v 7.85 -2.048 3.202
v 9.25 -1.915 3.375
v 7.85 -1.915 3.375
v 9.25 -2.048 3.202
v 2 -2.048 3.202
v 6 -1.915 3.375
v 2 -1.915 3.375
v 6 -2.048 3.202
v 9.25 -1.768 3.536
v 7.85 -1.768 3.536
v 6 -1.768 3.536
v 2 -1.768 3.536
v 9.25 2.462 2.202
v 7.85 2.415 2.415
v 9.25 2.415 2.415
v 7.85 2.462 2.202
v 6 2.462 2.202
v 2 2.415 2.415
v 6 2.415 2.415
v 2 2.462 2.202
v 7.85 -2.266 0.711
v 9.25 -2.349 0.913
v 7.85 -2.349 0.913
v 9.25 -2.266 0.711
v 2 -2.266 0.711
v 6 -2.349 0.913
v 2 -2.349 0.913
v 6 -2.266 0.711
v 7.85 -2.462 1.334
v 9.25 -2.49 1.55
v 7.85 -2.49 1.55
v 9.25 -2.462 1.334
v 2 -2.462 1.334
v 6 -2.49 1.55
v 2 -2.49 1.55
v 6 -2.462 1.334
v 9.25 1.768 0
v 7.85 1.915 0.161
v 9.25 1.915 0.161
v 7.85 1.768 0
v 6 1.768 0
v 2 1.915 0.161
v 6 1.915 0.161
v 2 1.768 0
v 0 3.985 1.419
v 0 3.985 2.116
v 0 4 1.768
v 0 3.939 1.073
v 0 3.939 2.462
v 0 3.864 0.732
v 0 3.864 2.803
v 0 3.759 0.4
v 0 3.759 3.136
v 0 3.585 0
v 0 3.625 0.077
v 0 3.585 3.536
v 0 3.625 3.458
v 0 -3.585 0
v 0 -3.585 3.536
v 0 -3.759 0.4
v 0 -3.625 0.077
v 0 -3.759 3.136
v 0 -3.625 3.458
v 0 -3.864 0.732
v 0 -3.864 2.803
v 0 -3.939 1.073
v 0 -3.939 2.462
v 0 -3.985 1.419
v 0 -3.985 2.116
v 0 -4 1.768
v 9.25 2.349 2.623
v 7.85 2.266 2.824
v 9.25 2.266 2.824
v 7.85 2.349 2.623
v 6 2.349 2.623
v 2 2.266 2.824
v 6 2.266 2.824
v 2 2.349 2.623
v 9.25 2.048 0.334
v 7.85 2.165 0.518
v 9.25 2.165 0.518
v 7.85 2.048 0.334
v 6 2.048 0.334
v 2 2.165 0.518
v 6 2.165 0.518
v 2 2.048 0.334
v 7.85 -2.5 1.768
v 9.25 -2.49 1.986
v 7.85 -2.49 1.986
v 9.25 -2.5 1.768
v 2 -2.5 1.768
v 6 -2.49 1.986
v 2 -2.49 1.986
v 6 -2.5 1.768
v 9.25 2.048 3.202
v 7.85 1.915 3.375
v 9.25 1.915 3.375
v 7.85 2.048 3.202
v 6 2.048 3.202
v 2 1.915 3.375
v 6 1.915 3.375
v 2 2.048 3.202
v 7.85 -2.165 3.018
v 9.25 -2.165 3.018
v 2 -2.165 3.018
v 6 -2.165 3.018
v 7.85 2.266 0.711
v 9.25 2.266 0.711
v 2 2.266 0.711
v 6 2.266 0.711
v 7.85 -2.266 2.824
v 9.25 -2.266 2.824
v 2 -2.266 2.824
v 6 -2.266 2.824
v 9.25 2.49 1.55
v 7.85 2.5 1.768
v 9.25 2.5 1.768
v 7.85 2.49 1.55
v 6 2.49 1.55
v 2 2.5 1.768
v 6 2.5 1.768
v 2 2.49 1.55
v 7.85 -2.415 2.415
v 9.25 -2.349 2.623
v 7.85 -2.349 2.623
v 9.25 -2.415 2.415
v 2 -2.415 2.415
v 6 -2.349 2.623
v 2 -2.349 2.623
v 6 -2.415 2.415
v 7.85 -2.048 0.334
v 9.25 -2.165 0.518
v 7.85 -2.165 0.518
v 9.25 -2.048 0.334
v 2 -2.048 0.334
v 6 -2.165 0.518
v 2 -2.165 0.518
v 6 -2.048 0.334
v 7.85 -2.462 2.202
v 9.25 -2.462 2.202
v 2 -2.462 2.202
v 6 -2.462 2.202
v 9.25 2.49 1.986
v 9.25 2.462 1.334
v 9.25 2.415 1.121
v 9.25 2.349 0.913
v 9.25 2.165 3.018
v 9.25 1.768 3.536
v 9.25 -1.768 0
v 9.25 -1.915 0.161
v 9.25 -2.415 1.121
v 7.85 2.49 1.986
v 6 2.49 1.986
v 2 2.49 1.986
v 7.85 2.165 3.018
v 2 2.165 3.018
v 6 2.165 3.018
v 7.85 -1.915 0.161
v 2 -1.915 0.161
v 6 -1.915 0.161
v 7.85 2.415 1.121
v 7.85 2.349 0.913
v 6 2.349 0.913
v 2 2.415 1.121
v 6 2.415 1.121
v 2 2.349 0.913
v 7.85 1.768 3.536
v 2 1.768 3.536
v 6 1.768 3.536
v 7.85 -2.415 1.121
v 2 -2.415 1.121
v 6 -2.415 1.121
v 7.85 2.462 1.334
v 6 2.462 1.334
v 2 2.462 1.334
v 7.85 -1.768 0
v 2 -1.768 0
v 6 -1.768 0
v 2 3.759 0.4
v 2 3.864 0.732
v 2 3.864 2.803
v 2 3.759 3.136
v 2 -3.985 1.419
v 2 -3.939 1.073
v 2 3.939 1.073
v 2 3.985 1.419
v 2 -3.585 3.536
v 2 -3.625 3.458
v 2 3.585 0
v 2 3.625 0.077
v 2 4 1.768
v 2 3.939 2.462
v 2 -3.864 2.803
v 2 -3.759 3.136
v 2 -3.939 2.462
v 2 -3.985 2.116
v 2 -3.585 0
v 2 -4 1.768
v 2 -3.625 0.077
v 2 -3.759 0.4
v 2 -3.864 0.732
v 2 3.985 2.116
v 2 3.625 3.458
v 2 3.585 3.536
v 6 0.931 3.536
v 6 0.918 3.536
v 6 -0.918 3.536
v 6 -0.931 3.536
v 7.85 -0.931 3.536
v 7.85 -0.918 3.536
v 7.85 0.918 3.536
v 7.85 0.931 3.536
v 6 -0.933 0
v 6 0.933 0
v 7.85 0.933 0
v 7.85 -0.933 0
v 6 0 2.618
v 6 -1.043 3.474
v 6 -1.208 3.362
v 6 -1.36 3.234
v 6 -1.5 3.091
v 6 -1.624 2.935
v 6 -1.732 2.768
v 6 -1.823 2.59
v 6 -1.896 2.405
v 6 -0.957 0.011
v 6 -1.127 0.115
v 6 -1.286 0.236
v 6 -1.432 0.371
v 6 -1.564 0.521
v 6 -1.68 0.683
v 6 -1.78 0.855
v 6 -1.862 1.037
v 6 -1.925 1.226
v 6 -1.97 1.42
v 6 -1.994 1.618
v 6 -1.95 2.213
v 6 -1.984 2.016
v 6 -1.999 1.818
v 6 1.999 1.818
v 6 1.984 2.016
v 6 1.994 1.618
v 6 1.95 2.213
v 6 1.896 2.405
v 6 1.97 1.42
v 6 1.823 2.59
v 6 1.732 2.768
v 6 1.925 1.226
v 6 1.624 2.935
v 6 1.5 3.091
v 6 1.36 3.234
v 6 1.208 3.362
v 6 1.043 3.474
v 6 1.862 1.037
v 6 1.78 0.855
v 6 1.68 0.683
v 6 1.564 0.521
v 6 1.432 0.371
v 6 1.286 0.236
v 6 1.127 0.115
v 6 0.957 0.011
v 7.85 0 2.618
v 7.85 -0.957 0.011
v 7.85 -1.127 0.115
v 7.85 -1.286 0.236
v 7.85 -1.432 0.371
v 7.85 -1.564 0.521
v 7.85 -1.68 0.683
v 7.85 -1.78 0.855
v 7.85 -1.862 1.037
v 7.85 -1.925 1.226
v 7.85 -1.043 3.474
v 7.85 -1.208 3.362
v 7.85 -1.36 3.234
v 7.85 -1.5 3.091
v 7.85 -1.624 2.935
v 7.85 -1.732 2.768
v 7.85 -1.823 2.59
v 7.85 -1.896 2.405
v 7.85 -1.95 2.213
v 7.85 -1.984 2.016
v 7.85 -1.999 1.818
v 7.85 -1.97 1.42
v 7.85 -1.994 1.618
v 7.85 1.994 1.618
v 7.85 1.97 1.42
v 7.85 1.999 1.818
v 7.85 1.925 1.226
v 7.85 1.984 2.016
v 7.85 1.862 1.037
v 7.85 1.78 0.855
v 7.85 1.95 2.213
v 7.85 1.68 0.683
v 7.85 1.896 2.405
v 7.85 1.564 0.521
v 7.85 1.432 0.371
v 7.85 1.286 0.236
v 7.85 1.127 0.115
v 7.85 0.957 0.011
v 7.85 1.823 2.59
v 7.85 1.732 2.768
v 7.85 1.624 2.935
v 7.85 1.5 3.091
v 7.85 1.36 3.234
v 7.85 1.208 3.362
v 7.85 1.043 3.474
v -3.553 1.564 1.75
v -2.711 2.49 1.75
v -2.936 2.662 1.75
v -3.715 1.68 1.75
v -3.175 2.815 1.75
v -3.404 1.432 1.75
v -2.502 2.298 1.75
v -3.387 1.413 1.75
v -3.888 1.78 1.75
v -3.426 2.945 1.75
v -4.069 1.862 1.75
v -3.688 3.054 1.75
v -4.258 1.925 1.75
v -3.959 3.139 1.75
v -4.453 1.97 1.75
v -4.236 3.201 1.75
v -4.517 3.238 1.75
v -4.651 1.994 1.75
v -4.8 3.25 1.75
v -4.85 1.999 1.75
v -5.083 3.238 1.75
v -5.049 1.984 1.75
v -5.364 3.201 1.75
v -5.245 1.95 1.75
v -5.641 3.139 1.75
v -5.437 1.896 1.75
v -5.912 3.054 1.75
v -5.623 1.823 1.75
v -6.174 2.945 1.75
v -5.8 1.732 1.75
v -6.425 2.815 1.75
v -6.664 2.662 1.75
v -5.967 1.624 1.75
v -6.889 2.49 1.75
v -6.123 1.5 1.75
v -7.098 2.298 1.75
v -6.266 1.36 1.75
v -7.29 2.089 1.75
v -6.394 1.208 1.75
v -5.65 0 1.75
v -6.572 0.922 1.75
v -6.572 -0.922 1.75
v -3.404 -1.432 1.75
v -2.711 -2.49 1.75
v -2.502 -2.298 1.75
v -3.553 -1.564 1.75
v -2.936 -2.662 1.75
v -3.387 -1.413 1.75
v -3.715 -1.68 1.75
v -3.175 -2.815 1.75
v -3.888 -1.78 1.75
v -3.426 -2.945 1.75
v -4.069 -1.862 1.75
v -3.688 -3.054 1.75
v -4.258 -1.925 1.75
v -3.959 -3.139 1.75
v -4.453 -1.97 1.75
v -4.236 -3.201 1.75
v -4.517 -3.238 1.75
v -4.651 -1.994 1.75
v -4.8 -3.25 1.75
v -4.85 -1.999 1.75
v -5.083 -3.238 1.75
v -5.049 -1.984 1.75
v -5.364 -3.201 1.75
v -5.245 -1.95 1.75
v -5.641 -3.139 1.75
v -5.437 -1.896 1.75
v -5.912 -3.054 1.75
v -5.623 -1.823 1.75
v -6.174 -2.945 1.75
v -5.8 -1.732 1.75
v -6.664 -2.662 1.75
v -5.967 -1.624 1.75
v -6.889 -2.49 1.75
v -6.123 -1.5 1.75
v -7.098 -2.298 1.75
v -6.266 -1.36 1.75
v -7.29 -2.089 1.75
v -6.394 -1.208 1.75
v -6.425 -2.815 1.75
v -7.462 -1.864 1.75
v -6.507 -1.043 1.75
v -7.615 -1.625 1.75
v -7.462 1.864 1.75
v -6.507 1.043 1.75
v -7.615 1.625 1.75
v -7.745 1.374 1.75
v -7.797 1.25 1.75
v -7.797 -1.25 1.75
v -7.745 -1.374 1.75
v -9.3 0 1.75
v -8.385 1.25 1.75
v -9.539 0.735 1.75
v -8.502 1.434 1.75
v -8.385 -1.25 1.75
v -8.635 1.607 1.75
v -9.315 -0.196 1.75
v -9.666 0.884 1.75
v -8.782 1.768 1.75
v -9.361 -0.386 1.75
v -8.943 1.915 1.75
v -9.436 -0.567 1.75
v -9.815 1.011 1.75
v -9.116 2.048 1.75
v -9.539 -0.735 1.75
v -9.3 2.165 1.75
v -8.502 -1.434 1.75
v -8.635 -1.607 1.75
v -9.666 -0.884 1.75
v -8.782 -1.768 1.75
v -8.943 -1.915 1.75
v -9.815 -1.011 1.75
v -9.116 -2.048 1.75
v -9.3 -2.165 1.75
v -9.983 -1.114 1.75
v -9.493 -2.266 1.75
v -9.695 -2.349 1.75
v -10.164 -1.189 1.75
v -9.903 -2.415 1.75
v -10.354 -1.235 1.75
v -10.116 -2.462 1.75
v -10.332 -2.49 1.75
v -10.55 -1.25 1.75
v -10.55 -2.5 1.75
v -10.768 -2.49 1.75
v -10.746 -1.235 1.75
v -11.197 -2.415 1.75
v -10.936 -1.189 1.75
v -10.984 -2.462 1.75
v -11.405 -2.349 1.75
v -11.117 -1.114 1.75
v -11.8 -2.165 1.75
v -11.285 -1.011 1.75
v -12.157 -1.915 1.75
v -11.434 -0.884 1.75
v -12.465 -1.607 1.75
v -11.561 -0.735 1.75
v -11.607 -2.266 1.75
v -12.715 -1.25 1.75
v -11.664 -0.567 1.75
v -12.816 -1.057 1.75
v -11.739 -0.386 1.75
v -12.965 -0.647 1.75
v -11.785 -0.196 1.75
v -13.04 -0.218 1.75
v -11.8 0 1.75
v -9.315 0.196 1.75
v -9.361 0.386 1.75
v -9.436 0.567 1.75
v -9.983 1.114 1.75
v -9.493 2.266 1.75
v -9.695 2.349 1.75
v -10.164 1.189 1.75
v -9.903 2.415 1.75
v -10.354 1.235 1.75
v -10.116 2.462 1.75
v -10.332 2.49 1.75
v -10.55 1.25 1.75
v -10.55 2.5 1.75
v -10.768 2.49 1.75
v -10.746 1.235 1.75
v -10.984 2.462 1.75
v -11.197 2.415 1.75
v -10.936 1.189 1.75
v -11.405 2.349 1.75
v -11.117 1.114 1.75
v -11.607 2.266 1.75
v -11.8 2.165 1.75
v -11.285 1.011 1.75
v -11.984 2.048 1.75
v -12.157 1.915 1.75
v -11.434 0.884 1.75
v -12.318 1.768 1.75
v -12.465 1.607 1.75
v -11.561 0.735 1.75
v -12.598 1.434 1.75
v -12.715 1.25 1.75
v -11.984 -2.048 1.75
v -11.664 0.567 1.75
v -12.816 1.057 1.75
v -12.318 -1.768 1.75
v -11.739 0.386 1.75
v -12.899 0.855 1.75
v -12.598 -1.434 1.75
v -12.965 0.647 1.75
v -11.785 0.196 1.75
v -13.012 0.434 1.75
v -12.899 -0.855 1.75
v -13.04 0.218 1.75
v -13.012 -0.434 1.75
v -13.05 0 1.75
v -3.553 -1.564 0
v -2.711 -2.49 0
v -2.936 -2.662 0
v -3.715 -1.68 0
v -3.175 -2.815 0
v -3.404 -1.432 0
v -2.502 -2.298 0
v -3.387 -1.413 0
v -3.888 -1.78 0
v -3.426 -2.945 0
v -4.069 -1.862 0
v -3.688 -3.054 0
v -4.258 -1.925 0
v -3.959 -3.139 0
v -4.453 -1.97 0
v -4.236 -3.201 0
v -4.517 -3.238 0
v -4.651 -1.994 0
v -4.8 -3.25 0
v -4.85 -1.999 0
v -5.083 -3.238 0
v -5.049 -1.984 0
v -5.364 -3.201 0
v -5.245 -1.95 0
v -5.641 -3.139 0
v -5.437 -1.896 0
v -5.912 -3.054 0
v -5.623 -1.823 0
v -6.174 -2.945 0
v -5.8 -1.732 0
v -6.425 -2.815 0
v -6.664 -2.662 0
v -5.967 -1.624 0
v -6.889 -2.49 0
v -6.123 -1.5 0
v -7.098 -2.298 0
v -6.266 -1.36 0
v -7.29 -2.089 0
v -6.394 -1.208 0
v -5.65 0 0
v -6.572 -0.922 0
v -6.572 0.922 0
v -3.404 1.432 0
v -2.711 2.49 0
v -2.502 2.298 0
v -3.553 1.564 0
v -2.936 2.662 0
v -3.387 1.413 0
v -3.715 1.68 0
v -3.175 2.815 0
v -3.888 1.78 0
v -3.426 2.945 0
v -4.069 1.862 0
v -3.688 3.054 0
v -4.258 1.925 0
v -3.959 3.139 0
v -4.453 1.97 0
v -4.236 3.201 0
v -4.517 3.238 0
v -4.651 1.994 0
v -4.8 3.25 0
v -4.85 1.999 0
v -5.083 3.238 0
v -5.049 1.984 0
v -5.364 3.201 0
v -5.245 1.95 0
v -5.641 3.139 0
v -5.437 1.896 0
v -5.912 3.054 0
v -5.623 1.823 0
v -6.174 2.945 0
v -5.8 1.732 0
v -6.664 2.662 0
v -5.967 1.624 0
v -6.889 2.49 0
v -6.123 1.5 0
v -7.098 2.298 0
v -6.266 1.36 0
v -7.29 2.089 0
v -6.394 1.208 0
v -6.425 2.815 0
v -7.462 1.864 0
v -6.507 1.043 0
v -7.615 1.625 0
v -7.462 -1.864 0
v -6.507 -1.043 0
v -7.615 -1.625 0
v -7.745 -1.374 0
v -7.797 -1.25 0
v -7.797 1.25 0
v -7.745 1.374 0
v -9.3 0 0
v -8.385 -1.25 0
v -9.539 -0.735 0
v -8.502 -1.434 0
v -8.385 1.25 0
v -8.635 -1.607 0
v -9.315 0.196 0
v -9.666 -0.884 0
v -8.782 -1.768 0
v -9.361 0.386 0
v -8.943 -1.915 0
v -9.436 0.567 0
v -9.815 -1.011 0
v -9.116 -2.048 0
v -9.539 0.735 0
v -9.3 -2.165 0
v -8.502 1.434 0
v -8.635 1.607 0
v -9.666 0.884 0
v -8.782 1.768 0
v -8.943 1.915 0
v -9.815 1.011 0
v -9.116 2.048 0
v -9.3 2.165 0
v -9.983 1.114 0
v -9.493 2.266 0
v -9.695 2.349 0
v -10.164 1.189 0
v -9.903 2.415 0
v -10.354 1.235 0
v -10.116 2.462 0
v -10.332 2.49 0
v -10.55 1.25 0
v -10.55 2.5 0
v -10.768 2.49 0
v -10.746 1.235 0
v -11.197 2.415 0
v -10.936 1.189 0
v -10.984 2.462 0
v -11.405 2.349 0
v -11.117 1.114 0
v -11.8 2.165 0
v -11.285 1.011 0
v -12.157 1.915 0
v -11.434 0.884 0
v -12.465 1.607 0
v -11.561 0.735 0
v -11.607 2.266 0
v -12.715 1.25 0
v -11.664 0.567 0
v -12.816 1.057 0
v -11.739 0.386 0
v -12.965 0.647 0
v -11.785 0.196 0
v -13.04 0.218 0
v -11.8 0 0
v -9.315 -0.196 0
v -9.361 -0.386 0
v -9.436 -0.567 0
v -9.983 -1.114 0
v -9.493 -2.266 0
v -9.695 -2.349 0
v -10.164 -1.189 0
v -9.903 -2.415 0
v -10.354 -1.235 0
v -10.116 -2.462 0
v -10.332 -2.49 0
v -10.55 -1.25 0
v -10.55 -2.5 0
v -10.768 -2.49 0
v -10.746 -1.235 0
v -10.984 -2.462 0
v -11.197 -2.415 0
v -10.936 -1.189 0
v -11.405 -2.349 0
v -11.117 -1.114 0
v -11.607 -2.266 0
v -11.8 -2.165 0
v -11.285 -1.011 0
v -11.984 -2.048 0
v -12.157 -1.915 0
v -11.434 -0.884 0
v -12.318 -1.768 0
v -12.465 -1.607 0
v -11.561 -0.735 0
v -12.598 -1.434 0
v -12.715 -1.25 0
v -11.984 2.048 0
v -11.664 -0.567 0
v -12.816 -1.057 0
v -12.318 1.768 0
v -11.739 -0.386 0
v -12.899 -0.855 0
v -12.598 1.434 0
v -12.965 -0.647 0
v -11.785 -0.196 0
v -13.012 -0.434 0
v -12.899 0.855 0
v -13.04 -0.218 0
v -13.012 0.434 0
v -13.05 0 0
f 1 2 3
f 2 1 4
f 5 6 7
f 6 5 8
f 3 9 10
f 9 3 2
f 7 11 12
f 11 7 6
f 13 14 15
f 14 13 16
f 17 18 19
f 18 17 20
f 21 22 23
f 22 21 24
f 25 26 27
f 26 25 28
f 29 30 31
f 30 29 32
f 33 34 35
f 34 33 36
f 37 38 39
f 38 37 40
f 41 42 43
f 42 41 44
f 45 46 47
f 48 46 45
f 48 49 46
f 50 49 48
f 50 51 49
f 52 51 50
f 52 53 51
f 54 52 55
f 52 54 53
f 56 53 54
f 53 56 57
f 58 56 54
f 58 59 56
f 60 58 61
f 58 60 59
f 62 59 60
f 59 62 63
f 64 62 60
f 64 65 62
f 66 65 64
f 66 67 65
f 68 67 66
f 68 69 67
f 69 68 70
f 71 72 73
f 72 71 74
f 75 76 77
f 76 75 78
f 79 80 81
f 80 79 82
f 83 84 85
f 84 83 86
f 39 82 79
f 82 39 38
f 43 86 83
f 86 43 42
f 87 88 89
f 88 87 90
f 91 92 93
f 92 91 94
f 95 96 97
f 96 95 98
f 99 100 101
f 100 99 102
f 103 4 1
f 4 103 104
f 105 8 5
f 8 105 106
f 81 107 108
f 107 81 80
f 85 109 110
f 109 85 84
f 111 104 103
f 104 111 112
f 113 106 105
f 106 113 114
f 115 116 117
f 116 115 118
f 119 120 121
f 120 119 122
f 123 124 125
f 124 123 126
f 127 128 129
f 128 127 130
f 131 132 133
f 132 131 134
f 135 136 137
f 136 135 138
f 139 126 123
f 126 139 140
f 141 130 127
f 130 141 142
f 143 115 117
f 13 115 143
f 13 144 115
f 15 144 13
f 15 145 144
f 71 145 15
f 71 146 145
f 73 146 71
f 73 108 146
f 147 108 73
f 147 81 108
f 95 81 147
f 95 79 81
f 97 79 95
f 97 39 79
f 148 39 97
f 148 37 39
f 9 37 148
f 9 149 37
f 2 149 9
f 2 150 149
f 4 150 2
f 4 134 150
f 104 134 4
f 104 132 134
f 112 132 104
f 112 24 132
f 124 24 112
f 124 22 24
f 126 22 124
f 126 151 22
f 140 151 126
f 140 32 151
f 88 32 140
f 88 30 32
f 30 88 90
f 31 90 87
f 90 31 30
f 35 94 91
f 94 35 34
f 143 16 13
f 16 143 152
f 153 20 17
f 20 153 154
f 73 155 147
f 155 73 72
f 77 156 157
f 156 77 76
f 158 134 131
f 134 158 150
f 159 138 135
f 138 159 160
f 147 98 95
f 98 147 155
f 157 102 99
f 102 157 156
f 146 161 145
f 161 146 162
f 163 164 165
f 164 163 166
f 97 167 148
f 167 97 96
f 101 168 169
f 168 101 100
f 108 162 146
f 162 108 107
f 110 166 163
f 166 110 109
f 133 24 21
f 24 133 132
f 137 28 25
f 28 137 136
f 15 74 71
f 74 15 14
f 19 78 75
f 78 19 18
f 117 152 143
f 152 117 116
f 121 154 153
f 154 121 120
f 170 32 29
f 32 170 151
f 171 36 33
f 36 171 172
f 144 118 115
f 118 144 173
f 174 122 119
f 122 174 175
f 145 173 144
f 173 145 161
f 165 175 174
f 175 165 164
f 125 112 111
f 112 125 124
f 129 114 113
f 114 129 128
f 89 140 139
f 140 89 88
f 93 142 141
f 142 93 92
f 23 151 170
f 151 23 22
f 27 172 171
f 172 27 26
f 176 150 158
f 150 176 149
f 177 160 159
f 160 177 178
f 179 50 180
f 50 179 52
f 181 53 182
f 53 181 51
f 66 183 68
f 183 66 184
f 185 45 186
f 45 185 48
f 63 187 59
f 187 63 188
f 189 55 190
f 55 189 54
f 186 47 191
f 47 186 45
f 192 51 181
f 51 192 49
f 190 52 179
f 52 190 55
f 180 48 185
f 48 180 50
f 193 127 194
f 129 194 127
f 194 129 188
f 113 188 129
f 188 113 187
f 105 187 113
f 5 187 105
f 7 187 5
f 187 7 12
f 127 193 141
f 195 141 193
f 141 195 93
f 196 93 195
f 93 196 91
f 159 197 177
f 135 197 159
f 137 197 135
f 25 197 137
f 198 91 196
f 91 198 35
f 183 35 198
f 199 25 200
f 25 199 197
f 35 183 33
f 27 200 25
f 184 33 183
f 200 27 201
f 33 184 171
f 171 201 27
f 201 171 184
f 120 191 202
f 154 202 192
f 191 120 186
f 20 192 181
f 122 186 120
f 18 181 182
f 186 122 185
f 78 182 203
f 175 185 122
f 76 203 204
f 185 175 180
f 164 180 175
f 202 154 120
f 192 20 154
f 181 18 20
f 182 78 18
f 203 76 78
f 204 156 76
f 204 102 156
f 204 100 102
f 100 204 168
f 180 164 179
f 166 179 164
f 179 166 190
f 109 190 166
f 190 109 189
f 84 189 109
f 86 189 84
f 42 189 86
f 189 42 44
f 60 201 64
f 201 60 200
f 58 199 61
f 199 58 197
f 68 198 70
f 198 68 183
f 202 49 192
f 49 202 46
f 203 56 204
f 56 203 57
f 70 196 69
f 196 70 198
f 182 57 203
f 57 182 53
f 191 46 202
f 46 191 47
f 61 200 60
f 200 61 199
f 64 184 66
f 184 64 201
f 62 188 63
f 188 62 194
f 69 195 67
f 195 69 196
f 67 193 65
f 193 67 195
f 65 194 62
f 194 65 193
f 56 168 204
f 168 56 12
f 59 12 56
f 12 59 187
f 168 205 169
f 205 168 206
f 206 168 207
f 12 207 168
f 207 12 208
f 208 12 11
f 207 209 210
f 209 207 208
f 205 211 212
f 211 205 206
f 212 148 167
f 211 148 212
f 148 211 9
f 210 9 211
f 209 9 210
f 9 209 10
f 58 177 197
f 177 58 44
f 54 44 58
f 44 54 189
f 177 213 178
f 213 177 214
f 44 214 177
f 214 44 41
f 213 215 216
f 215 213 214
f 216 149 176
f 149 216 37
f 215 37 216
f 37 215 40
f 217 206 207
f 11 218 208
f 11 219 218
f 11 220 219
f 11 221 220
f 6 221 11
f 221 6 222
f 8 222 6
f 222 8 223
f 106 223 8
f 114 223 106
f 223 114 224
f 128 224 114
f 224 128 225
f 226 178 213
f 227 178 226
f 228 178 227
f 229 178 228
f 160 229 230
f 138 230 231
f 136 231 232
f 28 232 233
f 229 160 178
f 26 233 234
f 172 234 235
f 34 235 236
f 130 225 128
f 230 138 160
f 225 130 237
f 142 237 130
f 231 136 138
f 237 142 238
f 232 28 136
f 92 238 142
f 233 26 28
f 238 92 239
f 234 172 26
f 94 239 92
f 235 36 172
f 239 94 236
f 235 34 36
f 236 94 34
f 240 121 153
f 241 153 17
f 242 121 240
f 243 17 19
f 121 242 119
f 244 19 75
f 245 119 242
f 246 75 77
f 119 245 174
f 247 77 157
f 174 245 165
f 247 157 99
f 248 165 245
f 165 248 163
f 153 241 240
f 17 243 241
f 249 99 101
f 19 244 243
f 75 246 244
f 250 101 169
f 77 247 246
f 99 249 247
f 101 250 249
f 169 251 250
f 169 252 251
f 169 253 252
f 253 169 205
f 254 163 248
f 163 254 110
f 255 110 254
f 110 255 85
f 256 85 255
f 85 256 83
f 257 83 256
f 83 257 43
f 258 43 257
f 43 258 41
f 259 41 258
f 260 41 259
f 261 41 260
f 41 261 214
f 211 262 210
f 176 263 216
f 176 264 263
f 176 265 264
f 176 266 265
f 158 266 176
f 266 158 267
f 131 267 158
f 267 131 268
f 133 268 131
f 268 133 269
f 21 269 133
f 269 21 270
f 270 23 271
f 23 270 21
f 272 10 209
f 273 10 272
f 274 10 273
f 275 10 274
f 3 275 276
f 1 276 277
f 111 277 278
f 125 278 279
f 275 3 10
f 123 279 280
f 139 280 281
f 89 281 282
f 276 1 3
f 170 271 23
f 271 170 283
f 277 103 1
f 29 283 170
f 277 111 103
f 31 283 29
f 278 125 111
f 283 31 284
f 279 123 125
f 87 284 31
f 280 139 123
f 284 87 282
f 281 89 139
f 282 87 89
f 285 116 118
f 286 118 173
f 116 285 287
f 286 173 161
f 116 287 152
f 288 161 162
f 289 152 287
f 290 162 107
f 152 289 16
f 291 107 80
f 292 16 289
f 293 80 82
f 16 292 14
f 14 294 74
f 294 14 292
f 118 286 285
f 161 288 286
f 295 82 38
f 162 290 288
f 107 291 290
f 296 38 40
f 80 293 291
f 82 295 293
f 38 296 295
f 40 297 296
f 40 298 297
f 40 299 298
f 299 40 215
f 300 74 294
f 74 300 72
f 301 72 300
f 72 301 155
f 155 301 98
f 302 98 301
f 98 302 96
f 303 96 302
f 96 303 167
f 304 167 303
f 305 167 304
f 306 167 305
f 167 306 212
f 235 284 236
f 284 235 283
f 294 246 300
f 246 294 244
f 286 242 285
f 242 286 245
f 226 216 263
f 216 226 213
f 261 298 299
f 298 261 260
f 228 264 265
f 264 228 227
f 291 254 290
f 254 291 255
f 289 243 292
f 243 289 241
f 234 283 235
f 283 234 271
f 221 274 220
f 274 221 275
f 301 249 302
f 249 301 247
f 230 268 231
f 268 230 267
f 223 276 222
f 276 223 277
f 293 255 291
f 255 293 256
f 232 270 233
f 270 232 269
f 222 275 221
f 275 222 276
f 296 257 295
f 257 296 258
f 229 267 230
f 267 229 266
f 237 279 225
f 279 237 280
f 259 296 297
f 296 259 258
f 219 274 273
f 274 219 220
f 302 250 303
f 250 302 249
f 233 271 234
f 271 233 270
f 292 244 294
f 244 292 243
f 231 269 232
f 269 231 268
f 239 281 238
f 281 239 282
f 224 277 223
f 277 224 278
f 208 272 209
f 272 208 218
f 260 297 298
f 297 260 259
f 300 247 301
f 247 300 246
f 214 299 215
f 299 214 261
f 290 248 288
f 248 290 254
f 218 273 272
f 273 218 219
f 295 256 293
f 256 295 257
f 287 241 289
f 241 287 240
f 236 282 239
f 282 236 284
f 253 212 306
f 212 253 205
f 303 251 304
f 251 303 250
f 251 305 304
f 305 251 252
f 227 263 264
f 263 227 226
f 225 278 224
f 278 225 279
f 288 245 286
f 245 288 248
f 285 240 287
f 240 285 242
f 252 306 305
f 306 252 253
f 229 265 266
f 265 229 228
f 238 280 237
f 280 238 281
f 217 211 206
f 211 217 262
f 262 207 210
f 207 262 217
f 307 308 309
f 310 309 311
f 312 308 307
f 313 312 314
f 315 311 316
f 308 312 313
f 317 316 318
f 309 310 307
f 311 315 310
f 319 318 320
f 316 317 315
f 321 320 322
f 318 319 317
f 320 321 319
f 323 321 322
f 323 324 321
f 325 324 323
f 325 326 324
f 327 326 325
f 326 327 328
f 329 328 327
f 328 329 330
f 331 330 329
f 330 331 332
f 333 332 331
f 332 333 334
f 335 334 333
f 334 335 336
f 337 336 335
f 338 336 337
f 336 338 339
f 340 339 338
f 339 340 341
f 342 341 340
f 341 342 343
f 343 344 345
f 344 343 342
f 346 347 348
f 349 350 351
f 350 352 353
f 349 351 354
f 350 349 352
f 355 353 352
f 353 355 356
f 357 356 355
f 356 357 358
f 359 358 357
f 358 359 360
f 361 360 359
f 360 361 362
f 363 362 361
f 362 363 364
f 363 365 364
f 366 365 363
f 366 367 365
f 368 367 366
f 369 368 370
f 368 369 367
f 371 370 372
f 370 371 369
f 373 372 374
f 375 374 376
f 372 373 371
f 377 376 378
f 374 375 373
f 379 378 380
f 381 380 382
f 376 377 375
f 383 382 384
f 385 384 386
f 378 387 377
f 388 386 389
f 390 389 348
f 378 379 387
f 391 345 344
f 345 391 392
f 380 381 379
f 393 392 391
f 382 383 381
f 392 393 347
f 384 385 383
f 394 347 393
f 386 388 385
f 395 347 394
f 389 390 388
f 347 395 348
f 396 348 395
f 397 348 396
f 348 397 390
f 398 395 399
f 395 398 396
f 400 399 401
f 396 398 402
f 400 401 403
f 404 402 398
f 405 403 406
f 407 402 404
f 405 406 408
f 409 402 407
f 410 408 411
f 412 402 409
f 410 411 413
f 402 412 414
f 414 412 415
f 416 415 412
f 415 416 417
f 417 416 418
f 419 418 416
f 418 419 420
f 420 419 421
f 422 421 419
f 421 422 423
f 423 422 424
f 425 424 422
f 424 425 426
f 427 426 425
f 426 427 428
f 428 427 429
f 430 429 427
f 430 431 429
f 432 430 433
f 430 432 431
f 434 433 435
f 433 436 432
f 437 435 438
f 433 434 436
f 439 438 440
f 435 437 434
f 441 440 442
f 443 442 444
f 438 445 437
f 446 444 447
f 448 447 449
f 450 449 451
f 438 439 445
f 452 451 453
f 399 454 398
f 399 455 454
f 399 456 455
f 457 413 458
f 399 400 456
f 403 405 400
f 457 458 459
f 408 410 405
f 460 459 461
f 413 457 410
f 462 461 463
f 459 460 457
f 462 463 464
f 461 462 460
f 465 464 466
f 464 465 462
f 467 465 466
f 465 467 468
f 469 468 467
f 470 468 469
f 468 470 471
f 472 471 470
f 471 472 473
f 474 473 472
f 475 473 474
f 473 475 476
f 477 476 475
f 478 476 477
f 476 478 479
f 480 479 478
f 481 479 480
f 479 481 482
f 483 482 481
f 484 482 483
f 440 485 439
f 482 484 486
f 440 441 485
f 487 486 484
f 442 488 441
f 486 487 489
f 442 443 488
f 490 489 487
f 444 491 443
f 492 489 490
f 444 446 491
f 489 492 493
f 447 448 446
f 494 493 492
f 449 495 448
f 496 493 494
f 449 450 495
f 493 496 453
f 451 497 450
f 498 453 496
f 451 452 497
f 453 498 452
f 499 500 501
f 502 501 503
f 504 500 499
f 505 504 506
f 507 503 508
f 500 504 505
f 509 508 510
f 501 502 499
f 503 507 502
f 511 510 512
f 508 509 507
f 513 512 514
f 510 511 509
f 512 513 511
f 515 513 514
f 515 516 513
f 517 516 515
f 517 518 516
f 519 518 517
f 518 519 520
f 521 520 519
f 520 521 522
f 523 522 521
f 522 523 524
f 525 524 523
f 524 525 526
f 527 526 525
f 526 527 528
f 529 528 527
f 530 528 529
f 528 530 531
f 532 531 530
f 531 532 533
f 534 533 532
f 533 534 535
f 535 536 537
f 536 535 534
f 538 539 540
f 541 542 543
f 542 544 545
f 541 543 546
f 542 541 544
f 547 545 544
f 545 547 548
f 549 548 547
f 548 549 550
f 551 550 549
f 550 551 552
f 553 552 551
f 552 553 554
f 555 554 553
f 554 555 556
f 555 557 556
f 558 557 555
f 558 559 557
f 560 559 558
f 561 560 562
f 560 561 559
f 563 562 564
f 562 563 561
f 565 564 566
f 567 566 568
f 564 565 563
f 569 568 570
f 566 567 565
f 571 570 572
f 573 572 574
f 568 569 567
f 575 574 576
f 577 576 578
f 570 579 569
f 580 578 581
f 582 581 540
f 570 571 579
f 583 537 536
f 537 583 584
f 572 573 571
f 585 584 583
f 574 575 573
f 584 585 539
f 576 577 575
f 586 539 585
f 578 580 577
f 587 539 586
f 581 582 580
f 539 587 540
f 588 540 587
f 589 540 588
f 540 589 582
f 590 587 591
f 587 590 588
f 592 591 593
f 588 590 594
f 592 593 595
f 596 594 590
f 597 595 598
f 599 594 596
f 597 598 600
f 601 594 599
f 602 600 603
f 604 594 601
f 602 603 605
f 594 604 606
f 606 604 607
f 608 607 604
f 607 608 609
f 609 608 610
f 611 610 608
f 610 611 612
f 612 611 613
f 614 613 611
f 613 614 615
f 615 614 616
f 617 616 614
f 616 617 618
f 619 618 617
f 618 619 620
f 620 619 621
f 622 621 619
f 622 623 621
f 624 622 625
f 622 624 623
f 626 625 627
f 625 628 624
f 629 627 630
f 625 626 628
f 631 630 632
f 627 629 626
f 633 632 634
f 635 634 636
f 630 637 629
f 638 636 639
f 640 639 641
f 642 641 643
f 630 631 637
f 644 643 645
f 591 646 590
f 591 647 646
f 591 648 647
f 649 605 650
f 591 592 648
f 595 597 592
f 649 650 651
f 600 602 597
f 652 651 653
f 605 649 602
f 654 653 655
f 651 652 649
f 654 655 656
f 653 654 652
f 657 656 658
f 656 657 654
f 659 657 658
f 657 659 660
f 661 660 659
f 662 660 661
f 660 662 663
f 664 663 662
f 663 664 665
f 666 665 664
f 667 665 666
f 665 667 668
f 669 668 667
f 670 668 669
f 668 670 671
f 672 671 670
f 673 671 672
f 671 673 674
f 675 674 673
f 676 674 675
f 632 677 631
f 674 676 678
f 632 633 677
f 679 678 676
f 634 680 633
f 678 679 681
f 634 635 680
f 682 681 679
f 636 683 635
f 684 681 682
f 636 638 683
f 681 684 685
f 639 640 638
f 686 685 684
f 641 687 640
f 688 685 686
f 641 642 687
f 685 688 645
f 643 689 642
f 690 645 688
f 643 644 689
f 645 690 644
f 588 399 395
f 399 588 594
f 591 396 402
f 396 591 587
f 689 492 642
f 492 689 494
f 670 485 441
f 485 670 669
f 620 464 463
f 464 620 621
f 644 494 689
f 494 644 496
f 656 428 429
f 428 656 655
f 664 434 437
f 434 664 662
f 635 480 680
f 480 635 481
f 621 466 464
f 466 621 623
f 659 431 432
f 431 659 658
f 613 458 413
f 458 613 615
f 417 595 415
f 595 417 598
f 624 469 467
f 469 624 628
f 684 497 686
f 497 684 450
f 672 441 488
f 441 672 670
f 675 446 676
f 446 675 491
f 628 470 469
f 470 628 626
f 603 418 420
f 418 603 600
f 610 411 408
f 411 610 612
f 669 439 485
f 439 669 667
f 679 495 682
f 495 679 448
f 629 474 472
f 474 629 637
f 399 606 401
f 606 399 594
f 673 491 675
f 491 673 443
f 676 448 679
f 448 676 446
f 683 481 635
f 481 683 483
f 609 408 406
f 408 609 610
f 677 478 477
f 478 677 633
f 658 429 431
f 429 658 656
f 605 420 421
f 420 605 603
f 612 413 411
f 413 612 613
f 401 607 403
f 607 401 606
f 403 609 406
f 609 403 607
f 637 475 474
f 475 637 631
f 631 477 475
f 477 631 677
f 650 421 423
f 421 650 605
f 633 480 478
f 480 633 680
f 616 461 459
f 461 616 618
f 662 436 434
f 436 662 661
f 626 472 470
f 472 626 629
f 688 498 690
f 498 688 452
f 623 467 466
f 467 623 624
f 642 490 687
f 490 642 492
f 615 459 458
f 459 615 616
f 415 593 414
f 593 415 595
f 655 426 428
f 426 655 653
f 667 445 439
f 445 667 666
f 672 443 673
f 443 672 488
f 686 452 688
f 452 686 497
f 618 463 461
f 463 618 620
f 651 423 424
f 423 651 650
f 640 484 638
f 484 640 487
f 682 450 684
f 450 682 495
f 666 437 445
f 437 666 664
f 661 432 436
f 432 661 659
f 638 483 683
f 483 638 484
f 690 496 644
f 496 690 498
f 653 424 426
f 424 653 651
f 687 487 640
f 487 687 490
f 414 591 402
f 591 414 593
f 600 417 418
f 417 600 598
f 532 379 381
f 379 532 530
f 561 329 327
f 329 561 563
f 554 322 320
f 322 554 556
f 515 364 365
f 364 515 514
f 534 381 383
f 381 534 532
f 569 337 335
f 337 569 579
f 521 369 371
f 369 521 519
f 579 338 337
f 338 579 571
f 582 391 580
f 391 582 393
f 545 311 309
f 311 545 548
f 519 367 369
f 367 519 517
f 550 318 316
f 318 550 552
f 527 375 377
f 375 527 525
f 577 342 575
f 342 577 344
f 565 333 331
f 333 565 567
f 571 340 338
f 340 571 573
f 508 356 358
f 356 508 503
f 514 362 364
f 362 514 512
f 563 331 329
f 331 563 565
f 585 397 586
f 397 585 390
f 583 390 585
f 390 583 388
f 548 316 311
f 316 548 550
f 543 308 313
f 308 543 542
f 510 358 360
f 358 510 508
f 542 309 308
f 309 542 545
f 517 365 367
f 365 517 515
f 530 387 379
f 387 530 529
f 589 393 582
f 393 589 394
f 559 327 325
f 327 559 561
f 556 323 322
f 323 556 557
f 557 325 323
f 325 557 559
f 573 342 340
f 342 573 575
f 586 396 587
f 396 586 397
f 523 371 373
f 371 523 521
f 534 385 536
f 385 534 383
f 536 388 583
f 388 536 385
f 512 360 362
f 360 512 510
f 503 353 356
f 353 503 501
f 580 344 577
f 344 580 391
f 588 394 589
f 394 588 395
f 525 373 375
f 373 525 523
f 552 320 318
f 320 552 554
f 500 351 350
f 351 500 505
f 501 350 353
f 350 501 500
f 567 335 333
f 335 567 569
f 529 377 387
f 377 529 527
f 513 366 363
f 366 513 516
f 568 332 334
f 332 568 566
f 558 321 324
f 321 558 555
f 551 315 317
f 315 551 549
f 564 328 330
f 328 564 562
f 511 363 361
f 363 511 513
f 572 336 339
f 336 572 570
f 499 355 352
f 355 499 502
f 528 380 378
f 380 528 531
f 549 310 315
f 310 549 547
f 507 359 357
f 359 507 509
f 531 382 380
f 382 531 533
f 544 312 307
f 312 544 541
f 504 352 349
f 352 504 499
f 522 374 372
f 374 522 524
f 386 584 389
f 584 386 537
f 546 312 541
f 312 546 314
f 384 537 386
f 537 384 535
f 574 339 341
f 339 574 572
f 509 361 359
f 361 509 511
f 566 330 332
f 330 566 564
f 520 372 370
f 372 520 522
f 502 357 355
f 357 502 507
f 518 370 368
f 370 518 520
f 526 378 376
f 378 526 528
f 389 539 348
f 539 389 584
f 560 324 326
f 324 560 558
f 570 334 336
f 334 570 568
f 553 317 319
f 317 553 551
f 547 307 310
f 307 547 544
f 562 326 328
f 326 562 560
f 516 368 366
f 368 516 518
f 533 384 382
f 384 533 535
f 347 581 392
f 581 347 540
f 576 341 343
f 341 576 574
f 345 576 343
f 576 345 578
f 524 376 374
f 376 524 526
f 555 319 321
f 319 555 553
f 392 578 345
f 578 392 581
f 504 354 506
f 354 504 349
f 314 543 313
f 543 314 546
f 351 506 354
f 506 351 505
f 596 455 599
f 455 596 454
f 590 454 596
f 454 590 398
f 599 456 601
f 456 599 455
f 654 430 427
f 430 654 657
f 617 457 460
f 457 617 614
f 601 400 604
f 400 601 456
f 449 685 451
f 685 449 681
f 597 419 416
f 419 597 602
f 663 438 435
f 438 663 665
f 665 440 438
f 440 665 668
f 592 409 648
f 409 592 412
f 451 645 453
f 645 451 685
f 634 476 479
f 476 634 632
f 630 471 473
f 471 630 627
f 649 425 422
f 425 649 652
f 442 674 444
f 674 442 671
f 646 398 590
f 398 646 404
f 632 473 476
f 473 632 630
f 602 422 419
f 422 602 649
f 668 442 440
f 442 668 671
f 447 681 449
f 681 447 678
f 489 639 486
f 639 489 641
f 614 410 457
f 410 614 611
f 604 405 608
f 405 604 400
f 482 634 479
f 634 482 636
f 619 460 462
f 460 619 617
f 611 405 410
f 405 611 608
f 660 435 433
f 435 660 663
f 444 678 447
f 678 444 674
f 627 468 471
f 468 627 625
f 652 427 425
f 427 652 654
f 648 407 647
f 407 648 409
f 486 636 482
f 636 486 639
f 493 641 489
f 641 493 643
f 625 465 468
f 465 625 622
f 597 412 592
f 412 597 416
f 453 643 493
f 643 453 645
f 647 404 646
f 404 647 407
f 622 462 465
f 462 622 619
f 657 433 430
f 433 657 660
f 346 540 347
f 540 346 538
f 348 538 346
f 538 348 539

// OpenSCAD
//Part
part = "both"; // [pin,snapring,both,cutter]

//Axle diameter
daxle = 5;

//Thickness of material to hold together
tsheet = 4;

//Head Diameter   -- make relative
dhead = 8;

//Thickness of head 
thead = 2;


// How many handles shall the snap ring have? recomm:(1,3)
handle = 1; // [0,1,2,3,4]

//Depth of groove for snap ring
ddgroove =1;

//Snap ring thickness
tsnap = 1.75;

//Snap ring radial thickness (must be greater than groovedepth)
ddsnapring = 2.5;

//overstand on snap ring side
tover = 1.5;

// radial cutter clearance
tclear = 0.1;

// clearing
clr = 0.1;




/*
2013 Lukas Süss
A pin & clamping ring combo to clamp thin plates together.
e.g. usable as connectors for scissor mechanisms.
*/


$fa= 5;
$fs=0.2;



if(part == "pin"){ pin(); }
if(part == "snapring"){ snapring(); }
if(part == "both")
{ 
  pin();
  translate([-dhead*0.6,0,0]) snapring();
}
if(part == "cutter"){ cutter(); }



module pin(t=0)
{
  tges = thead+tsheet+tsnap+tover; 
  cutrat = 1/sqrt(2); // 1/sqrt(2) | cos(30)
  din = daxle-ddgroove;

  translate([0,0,((daxle)*cutrat+2*t)/2])
  difference()
  {
    intersection()
    {
      rotate(90,[0,1,0])
      union()
      {
        cylinder(r=daxle/2+t,h=tges);
        cylinder(r=dhead/2+t,h=thead);
      }
      cube([tges*3,20,(daxle)*cutrat+2*t],center=true);
    }
    rotate(90,[0,1,0]) translate([0,0,thead+tsheet])
    {
      difference()
      {
        cylinder(r=daxle/2*1.2+t,h=tsnap+clr);
        translate([0,0,-tsnap*0.1])
        cylinder(r=(daxle-ddgroove)/2+t,h=tsnap*1.2);
      }
      // rotation retention spike
      translate([-din/2-clr,0,]) cylinder(r=daxle/2*0.5,h=tsnap+clr,$fn=4);
    }

  }
}

module snapring()
{
  dout = daxle-ddgroove+ddsnapring;
  din = daxle-ddgroove;
  dhandle = 2.5;
  shift = dhandle*1.5;

  difference()
  {
    union()  // base body
    {
      cylinder(r=dout/2,h=tsnap);
      if (handle > 0)
      {
        for(i=[-(handle-1)/2:+(handle-1)/2])
        {
          rotate(90*i,[0,0,1])
          {
            translate([-shift/2 -din/2,0,tsnap/2])
            cube([shift,ddsnapring,tsnap],center=true);
 
            translate([-shift -din/2,0,0])
            cylinder(r=(dhandle+ddsnapring)/2,h=tsnap);
          }
        }
      } 

    }

    translate([0,0,-tsnap*0.1]) // main cemntral cuts
    {
      cylinder(r=din/2,h=tsnap*1.2);
      rotate(-45,[0,0,1])
      cube([dout*0.6,dout*0.6,tsnap*1.2]);
    }

    if (handle > 0) // handle hole cutting
    {
      for(i=[-(handle-1)/2:+(handle-1)/2])
      {
        rotate(90*i,[0,0,1])
        {
          translate([-shift -din/2,0,-tsnap*0.1])
          cylinder(r=dhandle/2,h=tsnap*1.2);
        }
      }
    }

  }
  //rotation retention spike
  translate([-din/2-clr,0,0]) cylinder(r=daxle/2*0.5,h=tsnap,$fn=4);
}

module cutter(clearance)
{
  pin(t=clearance);
}
